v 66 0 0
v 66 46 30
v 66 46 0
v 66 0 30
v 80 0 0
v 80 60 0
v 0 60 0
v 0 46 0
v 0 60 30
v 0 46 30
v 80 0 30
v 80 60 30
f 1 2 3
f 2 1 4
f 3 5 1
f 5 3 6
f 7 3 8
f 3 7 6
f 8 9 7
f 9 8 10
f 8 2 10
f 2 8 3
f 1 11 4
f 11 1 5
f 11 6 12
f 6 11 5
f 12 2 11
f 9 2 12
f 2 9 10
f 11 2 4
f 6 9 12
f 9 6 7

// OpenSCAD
// Two-part box enclosure for a small electronics board (e.g. an Arduino-based temperature logger),
// printed as one piece with a part between them. NOVEL general part.
//

box_x   = 70;
box_y   = 50;
box_z   = 30;
wall    = 2;
floor   = 2;

lip_t   = 1.5;
lip_h   = 4;
clearance = 0.2;

$fn = 48;

part_size_x = box_x + 10;
part_size_y = box_y + 10;
part_size_z = max(box_z, floor + lip_h + lip_t);      // tall enough for the box and the lip

difference() {
    cube([part_size_x, part_size_y, part_size_z]);
    for (p = [box_x + 5, box_y + 5])
        translate(p) cube([box_x - 2 * wall, box_y - 2 * wall, box_z + 1]);   // hollow the box side
}
